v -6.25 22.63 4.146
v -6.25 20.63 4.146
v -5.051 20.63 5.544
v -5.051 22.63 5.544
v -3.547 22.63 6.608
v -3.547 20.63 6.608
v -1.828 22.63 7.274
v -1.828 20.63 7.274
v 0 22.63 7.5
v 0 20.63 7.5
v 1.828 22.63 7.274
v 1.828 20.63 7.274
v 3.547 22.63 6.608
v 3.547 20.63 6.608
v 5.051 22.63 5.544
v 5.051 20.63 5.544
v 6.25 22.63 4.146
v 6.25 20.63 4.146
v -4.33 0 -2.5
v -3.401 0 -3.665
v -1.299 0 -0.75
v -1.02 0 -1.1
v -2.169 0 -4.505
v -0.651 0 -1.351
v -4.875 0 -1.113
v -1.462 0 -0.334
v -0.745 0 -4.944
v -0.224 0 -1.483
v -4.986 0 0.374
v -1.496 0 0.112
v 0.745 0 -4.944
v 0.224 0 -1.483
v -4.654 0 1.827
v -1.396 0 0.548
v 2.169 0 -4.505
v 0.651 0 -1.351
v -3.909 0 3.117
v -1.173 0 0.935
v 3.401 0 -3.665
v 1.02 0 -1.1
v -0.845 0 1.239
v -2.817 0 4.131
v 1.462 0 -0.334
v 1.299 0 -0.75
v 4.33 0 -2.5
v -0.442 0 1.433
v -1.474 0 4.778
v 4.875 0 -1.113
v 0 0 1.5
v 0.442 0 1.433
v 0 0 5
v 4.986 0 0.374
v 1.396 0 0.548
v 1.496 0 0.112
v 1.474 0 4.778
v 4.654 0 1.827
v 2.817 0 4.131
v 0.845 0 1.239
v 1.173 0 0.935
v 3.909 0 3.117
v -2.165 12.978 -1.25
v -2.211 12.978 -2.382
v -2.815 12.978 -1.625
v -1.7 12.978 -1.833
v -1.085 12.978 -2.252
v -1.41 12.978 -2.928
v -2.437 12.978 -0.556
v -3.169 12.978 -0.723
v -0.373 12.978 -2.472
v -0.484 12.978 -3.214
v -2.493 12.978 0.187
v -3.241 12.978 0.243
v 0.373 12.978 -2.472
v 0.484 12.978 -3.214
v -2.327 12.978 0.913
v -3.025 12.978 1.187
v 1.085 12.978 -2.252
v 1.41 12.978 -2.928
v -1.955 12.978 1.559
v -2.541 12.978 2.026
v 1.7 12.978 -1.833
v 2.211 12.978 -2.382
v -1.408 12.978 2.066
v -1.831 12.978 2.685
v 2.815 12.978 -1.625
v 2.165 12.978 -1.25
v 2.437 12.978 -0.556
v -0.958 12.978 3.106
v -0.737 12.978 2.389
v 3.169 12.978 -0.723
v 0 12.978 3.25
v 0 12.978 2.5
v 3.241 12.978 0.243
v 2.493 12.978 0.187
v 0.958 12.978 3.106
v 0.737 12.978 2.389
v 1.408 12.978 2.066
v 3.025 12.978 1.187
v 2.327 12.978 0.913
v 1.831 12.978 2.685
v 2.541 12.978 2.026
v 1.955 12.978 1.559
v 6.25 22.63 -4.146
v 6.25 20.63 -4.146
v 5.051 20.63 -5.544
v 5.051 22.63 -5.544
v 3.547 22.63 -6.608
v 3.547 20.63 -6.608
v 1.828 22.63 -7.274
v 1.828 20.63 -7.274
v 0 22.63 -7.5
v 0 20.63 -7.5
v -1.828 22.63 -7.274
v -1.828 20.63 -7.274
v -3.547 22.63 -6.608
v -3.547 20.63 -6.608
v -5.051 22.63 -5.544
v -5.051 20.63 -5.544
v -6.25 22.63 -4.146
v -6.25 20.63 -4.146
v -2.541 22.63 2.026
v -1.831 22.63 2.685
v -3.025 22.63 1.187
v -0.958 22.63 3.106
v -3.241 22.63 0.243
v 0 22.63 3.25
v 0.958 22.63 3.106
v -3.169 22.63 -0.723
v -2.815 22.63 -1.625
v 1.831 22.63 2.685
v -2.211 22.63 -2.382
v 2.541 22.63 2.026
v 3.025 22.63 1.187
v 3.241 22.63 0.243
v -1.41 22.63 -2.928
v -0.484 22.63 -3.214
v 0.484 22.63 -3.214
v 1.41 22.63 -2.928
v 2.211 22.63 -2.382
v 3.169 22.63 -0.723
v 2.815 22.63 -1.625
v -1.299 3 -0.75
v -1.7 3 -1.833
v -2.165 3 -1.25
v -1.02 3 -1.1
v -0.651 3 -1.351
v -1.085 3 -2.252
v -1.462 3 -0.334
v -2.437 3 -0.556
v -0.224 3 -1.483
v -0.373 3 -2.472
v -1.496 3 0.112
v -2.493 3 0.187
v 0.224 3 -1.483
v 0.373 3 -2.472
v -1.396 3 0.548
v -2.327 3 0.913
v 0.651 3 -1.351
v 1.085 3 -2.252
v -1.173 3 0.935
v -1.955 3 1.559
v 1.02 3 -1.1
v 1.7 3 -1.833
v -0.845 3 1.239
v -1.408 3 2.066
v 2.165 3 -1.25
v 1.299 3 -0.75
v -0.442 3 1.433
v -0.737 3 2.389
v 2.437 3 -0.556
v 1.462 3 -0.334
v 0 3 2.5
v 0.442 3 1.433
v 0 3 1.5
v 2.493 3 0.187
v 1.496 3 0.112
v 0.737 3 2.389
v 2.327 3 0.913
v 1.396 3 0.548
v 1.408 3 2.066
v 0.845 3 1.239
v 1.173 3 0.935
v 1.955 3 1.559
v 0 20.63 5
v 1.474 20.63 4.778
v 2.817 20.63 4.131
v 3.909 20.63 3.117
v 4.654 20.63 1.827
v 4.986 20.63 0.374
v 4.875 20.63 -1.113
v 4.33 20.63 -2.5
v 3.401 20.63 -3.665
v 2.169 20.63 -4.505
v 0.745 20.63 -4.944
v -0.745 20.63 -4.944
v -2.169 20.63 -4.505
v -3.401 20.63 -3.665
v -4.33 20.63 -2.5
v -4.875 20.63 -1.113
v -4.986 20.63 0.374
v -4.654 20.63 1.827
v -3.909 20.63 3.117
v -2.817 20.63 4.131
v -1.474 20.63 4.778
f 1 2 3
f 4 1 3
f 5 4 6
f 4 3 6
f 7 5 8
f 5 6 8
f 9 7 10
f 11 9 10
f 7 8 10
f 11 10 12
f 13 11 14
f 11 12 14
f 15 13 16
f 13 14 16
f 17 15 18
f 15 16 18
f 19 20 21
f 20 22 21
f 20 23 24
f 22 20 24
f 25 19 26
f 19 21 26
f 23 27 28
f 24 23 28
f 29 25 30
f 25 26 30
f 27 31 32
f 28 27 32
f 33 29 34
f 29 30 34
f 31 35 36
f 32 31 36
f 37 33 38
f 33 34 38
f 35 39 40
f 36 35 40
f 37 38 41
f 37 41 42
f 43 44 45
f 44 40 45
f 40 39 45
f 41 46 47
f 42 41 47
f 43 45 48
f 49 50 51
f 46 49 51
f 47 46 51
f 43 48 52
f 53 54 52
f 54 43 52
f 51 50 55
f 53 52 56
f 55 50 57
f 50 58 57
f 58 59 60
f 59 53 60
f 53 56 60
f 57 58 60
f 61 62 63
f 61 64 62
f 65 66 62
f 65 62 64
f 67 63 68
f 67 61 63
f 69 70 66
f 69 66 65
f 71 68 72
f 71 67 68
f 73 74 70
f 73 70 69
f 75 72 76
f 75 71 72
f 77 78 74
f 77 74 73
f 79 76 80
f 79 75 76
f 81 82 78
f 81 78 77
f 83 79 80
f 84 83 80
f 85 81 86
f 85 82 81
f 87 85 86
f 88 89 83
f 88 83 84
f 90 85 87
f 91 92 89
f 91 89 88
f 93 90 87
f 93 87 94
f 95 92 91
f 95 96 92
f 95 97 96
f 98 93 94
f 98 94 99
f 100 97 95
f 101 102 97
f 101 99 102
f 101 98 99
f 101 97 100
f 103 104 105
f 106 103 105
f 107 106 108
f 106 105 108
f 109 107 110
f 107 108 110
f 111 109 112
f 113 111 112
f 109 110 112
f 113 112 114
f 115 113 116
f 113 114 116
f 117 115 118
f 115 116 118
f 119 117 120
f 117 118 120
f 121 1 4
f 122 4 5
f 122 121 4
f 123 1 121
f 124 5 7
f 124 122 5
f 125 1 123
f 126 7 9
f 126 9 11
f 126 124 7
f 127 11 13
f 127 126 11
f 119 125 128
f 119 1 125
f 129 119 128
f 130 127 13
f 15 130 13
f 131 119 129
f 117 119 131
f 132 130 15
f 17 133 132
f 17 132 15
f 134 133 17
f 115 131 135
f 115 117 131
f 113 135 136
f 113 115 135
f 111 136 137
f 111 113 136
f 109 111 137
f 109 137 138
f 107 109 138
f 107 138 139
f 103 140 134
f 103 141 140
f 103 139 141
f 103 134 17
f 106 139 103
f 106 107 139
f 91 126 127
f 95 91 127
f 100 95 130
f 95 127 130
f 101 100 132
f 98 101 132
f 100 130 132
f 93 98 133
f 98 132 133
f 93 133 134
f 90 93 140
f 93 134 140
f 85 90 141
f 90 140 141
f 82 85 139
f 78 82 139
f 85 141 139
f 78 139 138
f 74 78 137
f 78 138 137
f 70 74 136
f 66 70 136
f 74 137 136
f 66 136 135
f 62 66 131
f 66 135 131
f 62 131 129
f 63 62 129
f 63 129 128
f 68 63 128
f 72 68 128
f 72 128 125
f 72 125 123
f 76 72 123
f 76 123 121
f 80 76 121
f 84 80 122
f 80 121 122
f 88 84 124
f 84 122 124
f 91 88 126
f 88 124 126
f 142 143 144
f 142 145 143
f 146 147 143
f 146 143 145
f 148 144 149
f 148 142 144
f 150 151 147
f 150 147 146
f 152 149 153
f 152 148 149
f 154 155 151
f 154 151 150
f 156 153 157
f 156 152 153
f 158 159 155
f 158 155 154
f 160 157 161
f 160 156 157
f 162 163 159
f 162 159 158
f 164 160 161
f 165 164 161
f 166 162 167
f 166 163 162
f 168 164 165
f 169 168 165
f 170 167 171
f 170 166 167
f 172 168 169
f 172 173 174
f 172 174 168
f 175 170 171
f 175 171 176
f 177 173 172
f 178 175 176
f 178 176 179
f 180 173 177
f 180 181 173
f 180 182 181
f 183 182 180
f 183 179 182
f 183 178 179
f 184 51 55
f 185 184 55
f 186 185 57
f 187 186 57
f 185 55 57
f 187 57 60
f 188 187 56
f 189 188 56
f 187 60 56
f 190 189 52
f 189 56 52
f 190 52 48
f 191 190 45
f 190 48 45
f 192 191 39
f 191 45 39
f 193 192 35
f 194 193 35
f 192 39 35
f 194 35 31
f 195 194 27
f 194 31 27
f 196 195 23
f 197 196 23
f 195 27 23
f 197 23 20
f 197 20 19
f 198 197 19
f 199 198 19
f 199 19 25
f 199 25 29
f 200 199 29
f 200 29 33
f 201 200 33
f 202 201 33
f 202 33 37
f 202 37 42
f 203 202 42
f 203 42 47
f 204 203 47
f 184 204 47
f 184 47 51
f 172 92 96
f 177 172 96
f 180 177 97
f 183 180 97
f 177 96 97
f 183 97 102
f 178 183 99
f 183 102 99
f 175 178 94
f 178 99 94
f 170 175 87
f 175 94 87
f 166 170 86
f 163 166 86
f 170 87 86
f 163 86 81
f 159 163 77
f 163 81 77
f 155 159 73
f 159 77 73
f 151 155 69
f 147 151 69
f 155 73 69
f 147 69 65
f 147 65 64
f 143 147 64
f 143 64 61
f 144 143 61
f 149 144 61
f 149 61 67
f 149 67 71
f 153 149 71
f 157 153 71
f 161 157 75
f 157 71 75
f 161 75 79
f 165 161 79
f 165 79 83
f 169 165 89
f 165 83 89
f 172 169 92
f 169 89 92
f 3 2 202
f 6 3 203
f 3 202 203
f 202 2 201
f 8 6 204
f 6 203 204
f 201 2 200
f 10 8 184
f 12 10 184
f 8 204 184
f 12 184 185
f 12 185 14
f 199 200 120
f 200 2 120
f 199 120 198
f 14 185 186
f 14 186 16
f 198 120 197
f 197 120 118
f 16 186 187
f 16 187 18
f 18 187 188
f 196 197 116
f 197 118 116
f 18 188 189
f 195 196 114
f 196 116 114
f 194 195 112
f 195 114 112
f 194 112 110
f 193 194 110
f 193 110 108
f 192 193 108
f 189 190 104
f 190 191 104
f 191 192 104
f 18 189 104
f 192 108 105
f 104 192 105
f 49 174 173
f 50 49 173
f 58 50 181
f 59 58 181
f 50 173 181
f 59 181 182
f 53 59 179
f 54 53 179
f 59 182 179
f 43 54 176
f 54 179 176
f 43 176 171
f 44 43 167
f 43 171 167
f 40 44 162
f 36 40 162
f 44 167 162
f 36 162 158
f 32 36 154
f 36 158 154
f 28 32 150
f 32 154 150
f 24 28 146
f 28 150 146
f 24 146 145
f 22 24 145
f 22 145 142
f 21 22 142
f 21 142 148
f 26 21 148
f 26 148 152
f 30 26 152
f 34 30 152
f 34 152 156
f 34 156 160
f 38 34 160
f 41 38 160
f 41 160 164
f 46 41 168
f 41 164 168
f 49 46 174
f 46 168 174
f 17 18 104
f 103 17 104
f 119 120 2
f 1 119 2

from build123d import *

# Parameters (mm, degrees)
SKETCH1_R           = 5
BOSS_EXTRUDE1_DEPTH = 22.63
SKETCH2_R           = 3.25
CUT_EXTRUDE1_DEPTH  = 9.652
SKETCH3_R           = 2.5
CUT_EXTRUDE2_DEPTH  = 9.978
SKETCH4_R           = 1.5
CUT_EXTRUDE3_DEPTH  = 3
BOSS_EXTRUDE3_START = -2
SKETCH5_R           = 5
BOSS_EXTRUDE3_DEPTH = 2


with BuildPart() as part:
    # Sketch1 → Boss-Extrude1 (new body)
    with BuildSketch(Plane(origin=(0, 0, 0), x_dir=(1, 0, 0), z_dir=(0, 1, 0))):
        with Locations(Location((0, 0, 0), (0, 0, 270))):
            Circle(SKETCH1_R)
    extrude(amount=BOSS_EXTRUDE1_DEPTH)

    # Sketch2 → Cut-Extrude1 (cut)
    with BuildSketch(Plane(origin=(0, 22.63, 0), x_dir=(1, 0, 0), z_dir=(0, 1, 0))):
        with Locations(Location((0, 0, 0), (0, 0, 270))):
            Circle(SKETCH2_R)
    extrude(amount=-CUT_EXTRUDE1_DEPTH, mode=Mode.SUBTRACT)

    # Sketch3 → Cut-Extrude2 (cut)
    with BuildSketch(Plane(origin=(0, 12.978, 0), x_dir=(1, 0, 0), z_dir=(0, 1, 0))):
        with Locations(Location((0, 0, 0), (0, 0, 270))):
            Circle(SKETCH3_R)
    extrude(amount=-CUT_EXTRUDE2_DEPTH, mode=Mode.SUBTRACT)

    # Sketch4 → Cut-Extrude3 (cut)
    with BuildSketch(Plane(origin=(0, 3, 0), x_dir=(1, 0, 0), z_dir=(0, 1, 0))):
        with Locations(Location((0, 0, 0), (0, 0, 270))):
            Circle(SKETCH4_R)
    extrude(amount=-CUT_EXTRUDE3_DEPTH, mode=Mode.SUBTRACT)

    # Sketch5 → Boss-Extrude3 (add)
    with BuildSketch(Plane(origin=(0, 22.63, 0), x_dir=(1, 0, 0), z_dir=(0, 1, 0)).offset(BOSS_EXTRUDE3_START)):
        with BuildLine():
            Line((6.25, -4.145780988), (6.25, 4.145780988))
            ThreePointArc((6.25, 4.145780988), (0, 7.5), (-6.25, 4.145780988))
            Line((-6.25, 4.145780988), (-6.25, -4.145780988))
            ThreePointArc((-6.25, -4.145780988), (0, -7.5), (6.25, -4.145780988))
        make_face()
        with Locations(Location((0, 0, 0), (0, 0, 270))):
            Circle(SKETCH5_R, mode=Mode.SUBTRACT)
    extrude(amount=BOSS_EXTRUDE3_DEPTH)


solid = part.part
